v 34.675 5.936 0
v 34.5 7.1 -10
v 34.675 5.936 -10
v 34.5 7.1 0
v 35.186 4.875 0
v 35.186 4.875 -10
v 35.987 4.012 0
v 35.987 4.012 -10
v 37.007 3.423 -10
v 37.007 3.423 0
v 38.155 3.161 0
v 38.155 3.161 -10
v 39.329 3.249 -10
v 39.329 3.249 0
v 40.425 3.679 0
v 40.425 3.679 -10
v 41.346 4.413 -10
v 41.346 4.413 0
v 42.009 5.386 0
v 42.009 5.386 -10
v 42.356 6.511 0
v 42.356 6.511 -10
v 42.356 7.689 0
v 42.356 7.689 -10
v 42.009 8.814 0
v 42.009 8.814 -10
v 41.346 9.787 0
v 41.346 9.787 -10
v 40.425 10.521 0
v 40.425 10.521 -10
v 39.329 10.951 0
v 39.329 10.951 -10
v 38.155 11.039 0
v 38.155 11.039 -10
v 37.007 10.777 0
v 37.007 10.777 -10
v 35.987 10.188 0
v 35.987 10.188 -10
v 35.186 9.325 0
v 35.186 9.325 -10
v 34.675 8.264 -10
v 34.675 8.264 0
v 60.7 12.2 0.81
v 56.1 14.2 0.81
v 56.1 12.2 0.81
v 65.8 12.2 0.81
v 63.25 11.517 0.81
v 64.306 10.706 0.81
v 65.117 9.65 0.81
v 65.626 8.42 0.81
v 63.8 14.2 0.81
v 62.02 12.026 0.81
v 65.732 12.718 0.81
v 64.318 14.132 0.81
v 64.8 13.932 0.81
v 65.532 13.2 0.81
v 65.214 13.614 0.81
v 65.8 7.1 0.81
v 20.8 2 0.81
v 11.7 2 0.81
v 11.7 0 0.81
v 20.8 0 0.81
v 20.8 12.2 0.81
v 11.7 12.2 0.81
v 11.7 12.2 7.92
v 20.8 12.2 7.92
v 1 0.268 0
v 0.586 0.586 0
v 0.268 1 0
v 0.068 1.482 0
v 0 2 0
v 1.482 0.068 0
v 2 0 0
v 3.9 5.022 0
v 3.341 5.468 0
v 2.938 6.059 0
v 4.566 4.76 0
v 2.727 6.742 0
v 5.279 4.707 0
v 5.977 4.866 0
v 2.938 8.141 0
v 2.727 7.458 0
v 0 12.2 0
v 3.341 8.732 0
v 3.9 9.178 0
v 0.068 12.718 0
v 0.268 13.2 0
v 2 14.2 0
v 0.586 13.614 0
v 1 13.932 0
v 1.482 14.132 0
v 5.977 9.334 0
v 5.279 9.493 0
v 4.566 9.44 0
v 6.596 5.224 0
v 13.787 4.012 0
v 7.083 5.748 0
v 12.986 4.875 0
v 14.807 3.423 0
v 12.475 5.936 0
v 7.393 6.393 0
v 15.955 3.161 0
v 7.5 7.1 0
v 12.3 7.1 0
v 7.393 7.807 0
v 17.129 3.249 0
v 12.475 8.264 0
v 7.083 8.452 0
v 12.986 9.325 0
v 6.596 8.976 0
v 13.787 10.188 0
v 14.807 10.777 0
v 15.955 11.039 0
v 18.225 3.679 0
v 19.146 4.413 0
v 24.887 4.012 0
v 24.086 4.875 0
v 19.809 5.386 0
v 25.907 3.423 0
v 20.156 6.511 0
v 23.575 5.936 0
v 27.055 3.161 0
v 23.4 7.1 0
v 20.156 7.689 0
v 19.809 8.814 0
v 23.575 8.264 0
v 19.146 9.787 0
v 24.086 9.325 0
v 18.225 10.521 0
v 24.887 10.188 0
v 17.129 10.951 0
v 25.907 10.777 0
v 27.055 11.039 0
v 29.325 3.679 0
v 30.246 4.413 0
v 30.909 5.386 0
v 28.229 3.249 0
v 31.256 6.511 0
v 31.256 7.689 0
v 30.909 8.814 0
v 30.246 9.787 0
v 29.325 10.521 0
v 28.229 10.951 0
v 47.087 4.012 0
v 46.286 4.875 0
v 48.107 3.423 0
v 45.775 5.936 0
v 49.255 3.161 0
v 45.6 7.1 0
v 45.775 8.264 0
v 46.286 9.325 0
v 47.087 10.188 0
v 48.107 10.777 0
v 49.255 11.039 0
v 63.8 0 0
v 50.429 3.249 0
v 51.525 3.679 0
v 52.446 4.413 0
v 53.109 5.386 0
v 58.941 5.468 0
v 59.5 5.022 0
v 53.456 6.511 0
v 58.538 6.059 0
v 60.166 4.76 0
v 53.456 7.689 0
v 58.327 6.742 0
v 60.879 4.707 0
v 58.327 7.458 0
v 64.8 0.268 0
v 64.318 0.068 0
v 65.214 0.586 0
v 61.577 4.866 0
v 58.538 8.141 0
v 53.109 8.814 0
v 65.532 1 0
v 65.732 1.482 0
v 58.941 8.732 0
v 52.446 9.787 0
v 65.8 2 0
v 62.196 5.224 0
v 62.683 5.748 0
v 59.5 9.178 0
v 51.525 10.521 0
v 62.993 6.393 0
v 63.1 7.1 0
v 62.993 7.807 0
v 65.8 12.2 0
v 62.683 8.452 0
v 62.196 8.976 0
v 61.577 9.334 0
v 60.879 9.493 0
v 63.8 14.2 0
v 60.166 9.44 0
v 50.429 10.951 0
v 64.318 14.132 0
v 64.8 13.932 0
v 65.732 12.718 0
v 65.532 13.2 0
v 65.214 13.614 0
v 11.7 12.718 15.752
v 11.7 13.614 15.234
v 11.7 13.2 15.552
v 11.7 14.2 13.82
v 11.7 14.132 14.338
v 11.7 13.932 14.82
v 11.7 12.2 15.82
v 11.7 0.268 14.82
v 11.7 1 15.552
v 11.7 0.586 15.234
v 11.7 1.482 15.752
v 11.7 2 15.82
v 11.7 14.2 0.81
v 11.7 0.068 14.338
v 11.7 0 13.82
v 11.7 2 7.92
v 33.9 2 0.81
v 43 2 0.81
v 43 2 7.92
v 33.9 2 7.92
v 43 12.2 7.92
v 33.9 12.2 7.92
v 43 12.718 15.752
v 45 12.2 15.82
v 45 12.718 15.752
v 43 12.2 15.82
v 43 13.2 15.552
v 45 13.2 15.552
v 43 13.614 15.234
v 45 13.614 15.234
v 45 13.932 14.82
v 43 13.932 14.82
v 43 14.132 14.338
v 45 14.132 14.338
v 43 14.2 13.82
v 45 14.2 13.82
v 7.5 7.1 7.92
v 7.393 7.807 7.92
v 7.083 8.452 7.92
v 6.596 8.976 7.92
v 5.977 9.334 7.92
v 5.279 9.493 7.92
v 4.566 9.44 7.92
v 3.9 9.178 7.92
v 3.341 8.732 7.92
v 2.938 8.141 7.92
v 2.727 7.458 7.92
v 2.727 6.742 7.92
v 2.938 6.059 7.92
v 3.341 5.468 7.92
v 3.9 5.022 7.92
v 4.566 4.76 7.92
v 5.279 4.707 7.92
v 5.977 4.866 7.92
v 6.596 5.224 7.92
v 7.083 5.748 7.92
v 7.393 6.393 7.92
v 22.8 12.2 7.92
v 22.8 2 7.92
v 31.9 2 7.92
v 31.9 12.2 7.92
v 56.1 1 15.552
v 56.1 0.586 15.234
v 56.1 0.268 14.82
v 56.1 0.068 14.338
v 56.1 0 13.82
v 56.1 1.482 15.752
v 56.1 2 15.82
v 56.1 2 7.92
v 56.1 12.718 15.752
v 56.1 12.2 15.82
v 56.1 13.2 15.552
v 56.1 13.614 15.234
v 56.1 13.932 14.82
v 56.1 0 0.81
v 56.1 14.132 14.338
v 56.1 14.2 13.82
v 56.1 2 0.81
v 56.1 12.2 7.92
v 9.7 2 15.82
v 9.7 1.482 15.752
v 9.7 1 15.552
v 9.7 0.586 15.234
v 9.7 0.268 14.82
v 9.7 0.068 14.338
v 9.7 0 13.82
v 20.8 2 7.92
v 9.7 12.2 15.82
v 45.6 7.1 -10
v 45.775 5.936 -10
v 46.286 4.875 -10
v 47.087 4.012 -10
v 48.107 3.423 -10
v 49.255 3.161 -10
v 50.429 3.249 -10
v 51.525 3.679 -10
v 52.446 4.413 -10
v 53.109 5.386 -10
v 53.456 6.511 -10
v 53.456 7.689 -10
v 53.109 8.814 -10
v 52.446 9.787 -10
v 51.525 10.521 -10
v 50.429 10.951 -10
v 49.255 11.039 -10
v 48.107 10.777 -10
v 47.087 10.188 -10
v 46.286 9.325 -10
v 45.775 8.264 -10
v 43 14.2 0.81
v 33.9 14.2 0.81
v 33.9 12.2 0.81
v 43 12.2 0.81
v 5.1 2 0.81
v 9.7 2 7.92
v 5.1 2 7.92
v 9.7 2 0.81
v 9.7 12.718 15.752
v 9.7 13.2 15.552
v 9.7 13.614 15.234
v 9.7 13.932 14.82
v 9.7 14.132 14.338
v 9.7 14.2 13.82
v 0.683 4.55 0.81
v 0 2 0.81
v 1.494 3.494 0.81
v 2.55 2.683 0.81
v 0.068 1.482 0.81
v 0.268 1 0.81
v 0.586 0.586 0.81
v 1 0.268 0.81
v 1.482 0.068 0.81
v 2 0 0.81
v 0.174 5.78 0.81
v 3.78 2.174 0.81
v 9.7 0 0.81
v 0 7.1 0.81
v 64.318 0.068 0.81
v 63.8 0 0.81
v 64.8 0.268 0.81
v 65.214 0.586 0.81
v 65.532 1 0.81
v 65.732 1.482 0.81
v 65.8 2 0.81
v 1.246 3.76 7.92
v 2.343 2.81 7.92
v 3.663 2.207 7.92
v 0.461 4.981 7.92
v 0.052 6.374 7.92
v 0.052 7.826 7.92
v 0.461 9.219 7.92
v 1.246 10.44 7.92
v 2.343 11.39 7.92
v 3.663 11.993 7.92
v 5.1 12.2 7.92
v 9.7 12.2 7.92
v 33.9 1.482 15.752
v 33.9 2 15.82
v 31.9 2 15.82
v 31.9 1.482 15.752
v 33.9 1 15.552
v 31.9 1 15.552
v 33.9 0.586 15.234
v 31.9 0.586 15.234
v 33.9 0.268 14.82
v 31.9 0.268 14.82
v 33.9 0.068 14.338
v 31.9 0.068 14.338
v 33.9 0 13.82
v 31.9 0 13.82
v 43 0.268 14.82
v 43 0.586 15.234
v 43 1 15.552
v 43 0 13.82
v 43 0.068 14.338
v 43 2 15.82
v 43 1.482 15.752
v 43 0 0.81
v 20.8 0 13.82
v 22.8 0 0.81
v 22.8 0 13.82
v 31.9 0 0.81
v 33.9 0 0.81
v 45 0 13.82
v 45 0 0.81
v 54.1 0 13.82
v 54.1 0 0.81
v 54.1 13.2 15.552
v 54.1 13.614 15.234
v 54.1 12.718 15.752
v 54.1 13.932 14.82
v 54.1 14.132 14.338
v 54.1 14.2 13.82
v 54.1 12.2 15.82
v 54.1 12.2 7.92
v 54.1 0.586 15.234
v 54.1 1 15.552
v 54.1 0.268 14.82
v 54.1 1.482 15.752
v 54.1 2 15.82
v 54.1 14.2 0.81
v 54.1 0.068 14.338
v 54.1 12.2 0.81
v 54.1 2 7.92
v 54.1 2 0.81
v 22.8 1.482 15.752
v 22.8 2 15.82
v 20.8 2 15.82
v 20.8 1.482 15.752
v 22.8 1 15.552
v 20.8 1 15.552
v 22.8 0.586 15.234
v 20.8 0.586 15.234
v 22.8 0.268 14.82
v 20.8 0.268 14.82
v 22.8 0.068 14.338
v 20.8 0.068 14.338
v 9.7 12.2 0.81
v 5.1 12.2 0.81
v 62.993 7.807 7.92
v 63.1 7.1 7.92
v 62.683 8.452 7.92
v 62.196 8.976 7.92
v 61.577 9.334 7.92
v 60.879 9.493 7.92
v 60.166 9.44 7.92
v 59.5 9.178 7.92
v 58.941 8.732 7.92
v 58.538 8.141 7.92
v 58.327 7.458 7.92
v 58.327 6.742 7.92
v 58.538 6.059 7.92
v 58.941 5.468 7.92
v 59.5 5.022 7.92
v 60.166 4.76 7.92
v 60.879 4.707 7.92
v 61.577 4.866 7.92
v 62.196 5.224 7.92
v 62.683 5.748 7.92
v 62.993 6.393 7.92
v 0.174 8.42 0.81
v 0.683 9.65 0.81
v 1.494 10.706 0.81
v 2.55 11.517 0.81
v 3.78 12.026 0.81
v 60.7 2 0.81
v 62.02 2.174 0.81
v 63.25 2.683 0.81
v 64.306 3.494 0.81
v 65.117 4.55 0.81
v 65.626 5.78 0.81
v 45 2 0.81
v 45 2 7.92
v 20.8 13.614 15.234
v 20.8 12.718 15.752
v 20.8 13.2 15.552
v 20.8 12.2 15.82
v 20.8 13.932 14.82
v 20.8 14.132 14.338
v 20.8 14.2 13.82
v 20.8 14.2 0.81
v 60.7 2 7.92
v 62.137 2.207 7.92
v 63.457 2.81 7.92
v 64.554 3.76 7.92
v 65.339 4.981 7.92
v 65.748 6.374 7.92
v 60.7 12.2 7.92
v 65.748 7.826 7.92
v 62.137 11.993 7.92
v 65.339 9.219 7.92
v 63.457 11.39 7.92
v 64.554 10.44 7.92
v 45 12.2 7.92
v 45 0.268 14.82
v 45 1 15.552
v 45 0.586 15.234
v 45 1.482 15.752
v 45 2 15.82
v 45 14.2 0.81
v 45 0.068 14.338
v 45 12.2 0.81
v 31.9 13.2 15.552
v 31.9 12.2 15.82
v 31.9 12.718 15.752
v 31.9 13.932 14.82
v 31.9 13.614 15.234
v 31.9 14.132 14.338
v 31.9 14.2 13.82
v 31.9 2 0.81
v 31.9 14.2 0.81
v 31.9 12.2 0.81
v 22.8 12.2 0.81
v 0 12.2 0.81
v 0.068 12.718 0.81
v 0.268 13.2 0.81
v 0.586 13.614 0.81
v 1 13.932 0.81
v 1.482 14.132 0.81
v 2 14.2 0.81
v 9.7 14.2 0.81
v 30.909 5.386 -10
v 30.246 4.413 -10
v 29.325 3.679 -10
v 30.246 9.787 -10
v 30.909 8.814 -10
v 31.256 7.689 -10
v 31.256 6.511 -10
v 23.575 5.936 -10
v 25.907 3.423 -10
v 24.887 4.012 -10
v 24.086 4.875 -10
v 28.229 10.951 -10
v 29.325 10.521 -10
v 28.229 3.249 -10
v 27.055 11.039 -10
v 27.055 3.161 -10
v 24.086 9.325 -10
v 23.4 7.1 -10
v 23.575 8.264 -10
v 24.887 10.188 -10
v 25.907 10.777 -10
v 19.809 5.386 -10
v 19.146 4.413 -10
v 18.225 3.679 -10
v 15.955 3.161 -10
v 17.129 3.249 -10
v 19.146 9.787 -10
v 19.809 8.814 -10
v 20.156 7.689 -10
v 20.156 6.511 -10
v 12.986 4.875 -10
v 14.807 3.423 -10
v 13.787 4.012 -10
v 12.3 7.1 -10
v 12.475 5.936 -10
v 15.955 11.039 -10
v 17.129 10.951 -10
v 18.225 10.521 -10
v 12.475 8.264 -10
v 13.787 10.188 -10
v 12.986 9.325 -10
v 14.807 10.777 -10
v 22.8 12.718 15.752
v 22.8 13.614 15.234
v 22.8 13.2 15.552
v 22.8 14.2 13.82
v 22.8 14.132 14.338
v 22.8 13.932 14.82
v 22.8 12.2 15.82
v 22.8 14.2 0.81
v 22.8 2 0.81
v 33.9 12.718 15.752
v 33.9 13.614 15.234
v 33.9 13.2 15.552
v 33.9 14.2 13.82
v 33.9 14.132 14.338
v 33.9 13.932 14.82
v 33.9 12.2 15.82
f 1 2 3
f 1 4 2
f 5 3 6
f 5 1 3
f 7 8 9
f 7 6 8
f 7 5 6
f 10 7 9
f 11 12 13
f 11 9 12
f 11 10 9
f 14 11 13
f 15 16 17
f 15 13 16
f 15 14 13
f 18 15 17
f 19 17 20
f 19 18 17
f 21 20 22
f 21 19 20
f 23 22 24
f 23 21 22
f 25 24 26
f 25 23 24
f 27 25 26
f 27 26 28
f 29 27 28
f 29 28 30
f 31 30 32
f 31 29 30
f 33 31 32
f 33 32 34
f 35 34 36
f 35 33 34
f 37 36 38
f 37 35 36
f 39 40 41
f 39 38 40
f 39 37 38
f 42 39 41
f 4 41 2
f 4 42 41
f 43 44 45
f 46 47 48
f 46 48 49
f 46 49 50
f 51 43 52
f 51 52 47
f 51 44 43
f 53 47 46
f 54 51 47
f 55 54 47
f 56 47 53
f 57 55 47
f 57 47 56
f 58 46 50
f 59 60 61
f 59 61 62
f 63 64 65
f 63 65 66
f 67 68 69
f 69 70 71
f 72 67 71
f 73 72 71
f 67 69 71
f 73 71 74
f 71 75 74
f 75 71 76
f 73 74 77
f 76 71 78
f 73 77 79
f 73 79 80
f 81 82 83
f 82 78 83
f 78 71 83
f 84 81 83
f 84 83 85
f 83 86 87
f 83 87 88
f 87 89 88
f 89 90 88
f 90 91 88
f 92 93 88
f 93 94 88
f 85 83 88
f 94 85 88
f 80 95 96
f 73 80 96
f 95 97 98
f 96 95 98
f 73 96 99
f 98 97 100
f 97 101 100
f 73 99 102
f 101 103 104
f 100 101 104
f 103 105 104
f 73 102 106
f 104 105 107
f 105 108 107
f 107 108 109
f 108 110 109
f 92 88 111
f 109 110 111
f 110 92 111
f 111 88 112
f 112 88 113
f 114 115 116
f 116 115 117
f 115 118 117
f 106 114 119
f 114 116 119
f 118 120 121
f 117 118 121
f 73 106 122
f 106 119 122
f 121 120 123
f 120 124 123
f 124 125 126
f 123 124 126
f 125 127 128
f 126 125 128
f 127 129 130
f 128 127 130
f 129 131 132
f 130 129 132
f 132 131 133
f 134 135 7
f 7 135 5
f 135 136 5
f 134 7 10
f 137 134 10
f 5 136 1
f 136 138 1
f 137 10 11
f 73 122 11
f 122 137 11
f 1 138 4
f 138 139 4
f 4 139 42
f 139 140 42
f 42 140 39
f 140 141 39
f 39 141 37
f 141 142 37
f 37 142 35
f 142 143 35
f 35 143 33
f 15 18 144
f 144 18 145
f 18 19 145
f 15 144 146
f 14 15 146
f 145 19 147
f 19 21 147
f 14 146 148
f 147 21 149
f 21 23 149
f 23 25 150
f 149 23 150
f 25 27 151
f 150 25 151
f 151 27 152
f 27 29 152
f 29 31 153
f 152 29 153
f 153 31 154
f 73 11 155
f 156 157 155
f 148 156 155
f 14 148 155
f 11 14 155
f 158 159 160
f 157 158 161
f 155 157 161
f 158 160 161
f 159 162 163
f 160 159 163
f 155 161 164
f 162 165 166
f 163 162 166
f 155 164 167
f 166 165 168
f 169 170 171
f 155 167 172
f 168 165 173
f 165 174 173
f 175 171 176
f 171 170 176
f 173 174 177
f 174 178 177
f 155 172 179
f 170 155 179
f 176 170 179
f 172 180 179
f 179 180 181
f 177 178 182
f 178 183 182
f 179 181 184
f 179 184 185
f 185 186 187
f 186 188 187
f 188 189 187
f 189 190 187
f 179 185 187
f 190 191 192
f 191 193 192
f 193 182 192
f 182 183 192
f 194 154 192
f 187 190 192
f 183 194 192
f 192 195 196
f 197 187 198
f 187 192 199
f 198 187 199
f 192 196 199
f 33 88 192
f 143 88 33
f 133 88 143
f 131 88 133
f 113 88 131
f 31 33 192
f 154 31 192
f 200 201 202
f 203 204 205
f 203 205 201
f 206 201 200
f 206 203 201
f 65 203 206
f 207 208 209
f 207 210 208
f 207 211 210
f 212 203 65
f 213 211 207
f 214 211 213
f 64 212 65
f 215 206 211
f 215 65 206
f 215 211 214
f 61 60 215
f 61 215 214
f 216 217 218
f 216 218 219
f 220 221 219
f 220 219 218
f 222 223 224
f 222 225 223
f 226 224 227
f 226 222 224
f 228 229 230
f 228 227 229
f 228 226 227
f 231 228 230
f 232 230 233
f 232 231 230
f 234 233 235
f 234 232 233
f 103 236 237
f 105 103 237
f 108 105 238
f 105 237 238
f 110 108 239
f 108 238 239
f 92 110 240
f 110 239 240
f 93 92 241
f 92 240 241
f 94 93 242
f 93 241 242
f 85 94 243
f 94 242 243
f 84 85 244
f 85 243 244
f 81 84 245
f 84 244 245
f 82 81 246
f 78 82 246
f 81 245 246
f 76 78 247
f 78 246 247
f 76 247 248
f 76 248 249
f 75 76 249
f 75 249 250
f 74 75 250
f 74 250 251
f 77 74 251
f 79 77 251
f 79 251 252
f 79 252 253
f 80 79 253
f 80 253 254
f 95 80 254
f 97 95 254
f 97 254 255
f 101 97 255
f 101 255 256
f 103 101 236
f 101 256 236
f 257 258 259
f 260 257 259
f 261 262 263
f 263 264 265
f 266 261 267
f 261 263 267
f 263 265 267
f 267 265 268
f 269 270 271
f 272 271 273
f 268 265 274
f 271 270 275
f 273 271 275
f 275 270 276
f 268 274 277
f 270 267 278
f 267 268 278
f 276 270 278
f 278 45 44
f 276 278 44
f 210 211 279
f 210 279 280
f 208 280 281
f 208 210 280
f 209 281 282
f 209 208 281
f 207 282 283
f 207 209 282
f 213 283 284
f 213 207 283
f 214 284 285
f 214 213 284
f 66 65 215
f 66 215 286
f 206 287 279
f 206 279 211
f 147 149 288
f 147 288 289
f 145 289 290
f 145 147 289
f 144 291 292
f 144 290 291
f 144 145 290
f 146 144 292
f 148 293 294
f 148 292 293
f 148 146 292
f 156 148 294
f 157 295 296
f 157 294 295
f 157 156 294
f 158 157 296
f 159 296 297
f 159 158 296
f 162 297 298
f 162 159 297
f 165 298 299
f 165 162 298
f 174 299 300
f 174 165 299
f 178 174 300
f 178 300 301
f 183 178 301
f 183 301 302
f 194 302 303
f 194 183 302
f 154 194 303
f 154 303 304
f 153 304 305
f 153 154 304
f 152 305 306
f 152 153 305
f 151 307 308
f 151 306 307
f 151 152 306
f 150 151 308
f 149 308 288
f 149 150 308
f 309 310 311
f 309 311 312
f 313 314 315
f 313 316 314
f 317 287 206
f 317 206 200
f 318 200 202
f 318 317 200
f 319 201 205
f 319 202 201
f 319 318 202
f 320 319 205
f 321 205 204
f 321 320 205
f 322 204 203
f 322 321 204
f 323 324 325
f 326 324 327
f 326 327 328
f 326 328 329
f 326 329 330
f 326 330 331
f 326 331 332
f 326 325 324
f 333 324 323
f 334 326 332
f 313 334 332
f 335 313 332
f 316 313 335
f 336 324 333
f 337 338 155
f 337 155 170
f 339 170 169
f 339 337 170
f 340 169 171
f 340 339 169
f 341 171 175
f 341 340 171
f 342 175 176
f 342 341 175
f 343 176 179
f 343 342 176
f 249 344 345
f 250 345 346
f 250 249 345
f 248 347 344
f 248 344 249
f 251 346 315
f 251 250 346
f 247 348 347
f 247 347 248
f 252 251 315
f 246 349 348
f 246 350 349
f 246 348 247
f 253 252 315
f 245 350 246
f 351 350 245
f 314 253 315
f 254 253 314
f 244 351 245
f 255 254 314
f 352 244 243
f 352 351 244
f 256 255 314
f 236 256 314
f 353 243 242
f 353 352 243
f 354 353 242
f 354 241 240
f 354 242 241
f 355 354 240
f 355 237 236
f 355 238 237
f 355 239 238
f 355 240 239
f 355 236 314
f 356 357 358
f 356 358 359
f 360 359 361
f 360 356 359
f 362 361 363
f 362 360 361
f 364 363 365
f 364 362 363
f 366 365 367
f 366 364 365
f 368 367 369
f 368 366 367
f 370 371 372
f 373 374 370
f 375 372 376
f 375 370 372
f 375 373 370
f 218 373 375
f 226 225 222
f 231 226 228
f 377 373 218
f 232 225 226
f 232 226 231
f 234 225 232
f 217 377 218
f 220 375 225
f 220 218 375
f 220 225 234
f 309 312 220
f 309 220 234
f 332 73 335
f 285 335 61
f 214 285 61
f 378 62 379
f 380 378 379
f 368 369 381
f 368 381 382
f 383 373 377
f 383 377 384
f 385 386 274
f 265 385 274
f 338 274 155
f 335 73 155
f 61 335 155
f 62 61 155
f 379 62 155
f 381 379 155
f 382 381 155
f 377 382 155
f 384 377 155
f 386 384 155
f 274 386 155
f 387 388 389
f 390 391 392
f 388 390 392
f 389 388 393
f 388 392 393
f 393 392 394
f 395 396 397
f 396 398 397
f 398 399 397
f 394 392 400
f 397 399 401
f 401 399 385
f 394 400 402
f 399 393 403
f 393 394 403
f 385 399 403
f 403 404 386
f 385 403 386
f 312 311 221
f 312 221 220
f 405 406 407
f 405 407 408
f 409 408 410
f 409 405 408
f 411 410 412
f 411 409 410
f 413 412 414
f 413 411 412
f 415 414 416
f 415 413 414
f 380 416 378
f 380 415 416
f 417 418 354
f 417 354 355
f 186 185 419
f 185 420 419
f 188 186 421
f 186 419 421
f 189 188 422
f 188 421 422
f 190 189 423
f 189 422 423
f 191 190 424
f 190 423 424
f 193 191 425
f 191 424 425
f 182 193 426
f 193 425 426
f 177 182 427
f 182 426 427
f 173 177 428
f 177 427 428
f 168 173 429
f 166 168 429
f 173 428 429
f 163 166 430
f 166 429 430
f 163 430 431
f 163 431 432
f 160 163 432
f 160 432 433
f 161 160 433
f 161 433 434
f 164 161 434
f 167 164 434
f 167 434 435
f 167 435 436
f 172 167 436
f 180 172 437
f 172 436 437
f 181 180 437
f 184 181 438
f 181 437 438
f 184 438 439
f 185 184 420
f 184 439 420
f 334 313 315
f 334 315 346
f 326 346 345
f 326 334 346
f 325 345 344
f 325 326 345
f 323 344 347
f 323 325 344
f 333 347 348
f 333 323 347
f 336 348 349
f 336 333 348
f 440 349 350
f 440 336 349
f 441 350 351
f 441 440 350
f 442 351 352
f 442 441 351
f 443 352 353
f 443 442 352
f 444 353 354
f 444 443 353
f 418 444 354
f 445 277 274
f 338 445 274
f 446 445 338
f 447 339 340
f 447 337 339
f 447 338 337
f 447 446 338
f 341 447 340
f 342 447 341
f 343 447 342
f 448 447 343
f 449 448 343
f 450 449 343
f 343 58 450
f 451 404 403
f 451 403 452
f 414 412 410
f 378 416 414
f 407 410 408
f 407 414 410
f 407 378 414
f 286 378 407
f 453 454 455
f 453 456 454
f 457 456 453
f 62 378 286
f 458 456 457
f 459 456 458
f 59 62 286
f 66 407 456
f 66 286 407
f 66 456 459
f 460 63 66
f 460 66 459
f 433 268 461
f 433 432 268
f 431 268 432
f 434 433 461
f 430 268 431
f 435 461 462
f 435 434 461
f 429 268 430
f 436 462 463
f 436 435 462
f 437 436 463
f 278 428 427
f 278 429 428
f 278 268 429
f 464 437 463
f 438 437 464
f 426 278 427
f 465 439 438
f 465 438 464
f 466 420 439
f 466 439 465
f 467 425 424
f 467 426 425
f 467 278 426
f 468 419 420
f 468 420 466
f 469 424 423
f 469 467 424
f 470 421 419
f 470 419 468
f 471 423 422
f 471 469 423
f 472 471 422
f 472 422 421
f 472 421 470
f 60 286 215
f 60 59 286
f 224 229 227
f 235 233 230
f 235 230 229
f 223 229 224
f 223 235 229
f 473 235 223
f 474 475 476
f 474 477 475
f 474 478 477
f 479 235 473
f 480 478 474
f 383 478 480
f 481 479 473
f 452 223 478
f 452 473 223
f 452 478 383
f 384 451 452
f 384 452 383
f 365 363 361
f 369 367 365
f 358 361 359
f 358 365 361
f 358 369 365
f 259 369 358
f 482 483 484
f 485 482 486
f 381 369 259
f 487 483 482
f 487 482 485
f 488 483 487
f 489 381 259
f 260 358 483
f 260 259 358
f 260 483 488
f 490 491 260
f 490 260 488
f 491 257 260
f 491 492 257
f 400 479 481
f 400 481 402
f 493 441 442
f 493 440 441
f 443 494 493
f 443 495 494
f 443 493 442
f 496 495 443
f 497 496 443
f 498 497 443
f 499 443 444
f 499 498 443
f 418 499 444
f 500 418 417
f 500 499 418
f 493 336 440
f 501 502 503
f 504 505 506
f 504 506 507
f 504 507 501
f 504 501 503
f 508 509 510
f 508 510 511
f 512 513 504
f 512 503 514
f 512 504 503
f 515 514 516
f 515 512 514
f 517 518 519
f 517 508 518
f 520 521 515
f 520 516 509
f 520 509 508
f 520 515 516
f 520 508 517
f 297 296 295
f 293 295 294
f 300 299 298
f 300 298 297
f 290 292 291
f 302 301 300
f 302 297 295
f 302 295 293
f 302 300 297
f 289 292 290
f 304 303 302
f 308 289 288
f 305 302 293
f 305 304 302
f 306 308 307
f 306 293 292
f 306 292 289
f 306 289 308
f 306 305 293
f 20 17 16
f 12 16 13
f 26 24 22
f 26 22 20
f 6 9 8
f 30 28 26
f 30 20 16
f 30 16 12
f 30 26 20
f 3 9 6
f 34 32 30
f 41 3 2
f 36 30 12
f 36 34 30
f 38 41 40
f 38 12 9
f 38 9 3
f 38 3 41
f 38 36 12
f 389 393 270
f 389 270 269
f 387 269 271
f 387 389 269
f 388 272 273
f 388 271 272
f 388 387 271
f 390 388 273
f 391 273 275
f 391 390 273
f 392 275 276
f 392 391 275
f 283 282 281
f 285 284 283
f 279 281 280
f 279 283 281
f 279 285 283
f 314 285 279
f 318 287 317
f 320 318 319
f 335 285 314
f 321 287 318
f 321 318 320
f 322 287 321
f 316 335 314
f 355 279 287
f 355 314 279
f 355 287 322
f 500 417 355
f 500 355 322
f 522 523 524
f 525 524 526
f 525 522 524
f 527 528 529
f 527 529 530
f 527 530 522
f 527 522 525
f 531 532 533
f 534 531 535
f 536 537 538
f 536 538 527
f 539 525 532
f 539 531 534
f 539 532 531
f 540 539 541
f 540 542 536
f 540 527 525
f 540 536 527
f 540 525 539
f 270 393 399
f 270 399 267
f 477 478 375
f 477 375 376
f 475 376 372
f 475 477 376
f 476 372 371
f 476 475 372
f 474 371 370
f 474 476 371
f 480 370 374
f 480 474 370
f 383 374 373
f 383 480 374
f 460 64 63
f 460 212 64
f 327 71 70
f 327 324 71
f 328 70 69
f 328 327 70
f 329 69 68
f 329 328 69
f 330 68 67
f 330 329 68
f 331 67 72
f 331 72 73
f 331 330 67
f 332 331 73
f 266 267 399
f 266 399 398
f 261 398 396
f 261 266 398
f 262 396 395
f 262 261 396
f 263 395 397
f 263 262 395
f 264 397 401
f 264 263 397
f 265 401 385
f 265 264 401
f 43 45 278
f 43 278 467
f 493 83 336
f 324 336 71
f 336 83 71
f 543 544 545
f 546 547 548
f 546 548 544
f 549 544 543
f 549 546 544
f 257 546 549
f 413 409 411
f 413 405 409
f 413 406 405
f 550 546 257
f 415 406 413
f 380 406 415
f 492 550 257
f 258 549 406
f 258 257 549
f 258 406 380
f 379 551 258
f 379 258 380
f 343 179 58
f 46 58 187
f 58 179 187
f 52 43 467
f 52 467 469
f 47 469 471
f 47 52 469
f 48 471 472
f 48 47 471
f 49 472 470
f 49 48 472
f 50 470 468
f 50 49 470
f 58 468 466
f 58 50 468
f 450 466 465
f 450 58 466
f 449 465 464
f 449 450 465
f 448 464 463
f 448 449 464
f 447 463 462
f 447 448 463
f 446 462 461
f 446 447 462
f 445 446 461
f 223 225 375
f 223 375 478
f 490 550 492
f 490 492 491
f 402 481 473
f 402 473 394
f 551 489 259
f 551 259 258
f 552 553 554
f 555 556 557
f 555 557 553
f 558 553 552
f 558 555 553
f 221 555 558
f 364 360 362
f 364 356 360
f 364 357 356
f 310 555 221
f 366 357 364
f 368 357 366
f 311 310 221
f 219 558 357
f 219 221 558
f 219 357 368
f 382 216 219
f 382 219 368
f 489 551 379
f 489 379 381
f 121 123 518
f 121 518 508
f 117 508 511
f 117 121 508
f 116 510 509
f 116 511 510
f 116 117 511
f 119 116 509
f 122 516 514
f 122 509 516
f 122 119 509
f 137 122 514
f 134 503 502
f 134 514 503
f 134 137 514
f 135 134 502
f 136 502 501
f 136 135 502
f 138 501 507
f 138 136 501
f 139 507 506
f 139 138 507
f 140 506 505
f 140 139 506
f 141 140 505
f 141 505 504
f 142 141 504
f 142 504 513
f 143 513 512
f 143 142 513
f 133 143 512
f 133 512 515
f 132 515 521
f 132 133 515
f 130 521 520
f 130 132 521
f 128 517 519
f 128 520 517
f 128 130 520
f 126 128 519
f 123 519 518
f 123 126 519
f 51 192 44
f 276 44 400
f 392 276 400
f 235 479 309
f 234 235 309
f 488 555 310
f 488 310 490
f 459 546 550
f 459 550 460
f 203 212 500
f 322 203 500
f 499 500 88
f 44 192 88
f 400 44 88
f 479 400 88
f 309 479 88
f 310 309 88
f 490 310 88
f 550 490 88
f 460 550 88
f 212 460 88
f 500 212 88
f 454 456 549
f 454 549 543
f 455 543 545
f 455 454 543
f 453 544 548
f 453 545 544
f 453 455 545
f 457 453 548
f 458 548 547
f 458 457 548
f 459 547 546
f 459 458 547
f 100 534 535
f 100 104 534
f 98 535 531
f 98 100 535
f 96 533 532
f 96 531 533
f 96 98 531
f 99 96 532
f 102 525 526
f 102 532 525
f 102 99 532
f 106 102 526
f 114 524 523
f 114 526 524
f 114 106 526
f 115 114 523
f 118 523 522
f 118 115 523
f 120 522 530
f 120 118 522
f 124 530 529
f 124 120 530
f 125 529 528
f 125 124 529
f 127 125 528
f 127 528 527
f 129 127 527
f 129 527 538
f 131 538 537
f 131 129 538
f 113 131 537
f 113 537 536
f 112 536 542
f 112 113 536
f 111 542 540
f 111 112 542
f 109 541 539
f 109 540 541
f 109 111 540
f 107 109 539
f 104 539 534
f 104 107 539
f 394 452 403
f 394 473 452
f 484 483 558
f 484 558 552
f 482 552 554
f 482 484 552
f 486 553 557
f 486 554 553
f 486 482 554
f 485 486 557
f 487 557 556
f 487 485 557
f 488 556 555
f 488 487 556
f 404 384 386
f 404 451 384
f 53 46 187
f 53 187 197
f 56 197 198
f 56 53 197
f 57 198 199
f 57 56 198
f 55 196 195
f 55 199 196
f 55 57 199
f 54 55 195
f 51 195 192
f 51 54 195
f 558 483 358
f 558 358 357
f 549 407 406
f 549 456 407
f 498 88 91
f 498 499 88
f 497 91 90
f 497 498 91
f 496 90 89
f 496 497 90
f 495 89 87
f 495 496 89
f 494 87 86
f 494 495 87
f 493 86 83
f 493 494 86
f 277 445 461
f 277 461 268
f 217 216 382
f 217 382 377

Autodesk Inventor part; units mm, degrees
ref_plane "YZ Plane" through (0, 0, 0) normal (1, 0, 0) x (0, 1, 0)
ref_plane "XZ Plane" through (0, 0, 0) normal (0, 1, 0) x (-1, 0, 0)
ref_plane "XY Plane" through (0, 0, 0) normal (0, 0, 1) x (1, 0, 0)
sketch "Sketch1" plane through (0, 0, 0) normal (0, 0, 1) x (1, 0, 0)
  line L0 (0, 0) -> (65.8, 0)
  line L1 (65.8, 0) -> (65.8, 14.2)
  line L2 (65.8, 14.2) -> (0, 14.2)
  line L3 (0, 14.2) -> (0, 0)
  dimension "d0" = 65.8
  dimension "d1" = 14.2
extrude "Extrusion1" add sketch "Sketch1" along normal blind 0.81
fillet "Fillet1" radius 2 4 edges at (0, 14.2, 0.405) (65.8, 14.2, 0.405) (65.8, 0, 0.405) (0, 0, 0.405)
sketch "Sketch2" plane through (0, 0, 0.81) normal (0, 0, 1) x (1, 0, 0)
  circle A0 centre (5.1, 7.1) radius 5.1
  line L0 (0, 12.2) -> (0, 2) projected
  circle A1 centre (60.7, 7.1) radius 5.1
  line L1 (65.8, 2) -> (65.8, 12.2) projected
  line L2 (5.1, 12.2) -> (60.7, 12.2)
  line L3 (60.7, 2) -> (5.1, 2)
  point P0 (0, 0)
  point P1 (0, 7.1)
  dimension "d5" = 10.2
  dimension "d6" = 10.2
extrude "Extrusion2" add sketch "Sketch2" along normal blind 7.11
sketch "Sketch3" plane through (0, 0, 7.92) normal (0, 0, 1) x (1, 0, 0)
  line L0 (2, 0) -> (63.8, 0) projected
  line L1 (32.9, 0) -> (32.9, 14.2) construction
  line L2 (63.8, 14.2) -> (2, 14.2) projected
  circle A0 centre (5.1, 7.1) radius 2.4
  circle A1 centre (60.7, 7.1) radius 2.4
  line L3 (5.1, 7.1) -> (60.7, 7.1) construction
  point P0 (0, 0)
  dimension "d9" = 4.8
  dimension "d10" = 4.8
  dimension "d12" = 27.8
  dimension "d13" = 27.8
  dimension "d14" = 7.1
extrude "Extrusion3" cut sketch "Sketch3" against normal through all
sketch "Sketch4" plane through (0, 0, 7.92) normal (0, 0, 1) x (1, 0, 0)
  line L0 (63.8, 14.2) -> (2, 14.2) projected
  line L1 (32.9, 14.2) -> (32.9, 0) construction
  line L2 (2, 0) -> (63.8, 0) projected
  line L3 (31.9, 14.2) -> (33.9, 14.2)
  line L4 (33.9, 14.2) -> (33.9, 0)
  line L5 (33.9, 0) -> (31.9, 0)
  line L6 (31.9, 0) -> (31.9, 14.2)
  line L7 (20.8, 14.2) -> (22.8, 14.2)
  line L8 (22.8, 14.2) -> (22.8, 0)
  line L9 (22.8, 0) -> (20.8, 0)
  line L10 (20.8, 0) -> (20.8, 14.2)
  line L11 (11.7, 0) -> (9.7, 0)
  line L12 (9.7, 0) -> (9.7, 14.2)
  line L13 (9.7, 14.2) -> (11.7, 14.2)
  line L14 (11.7, 14.2) -> (11.7, 0)
  line L15 (43, 14.2) -> (45, 14.2)
  line L16 (45, 14.2) -> (45, 0)
  line L17 (45, 0) -> (43, 0)
  line L18 (43, 0) -> (43, 14.2)
  line L19 (54.1, 0) -> (56.1, 0)
  line L20 (56.1, 0) -> (56.1, 14.2)
  line L21 (56.1, 14.2) -> (54.1, 14.2)
  line L22 (54.1, 14.2) -> (54.1, 0)
  point P0 (0, 0)
  dimension "d17" = 2
  dimension "d18" = 1
  dimension "d19" = 2
  dimension "d20" = 11.1
  dimension "d21" = 11.1
  dimension "d22" = 2
  dimension "d23" = 2
  dimension "d24" = 11.1
  dimension "d25" = 2
  dimension "d26" = 11.1
extrude "Extrusion4" add sketch "Sketch4" along normal mid plane 15.8 contours L20 L2 L22 L0 | L16 L2 L18 L0 | L4 L2 L6 L0 | L8 L2 L10 L0 | L14 L2 L12 L0
fillet "Fillet2" radius 2 10 edges at (10.7, 14.2, 15.82) (21.8, 14.2, 15.82) (32.9, 14.2, 15.82) (44, 14.2, 15.82) (55.1, 14.2, 15.82) (55.1, 0, 15.82) (44, 0, 15.82) (32.9, 0, 15.82) (21.8, 0, 15.82) (10.7, 0, 15.82)
sketch "Sketch5" plane through (0, 0, 0) normal (0, 0, -1) x (-1, 0, 0)
  arc A0 (-65.8, 7.1) -> (-60.7, 2) centre (-60.7, 7.1) ccw projected
  line L0 (0, 7.1) -> (0, 2) projected
  line L1 (-65.8, 7.1) -> (0, 7.1) construction
  circle A1 centre (-38.45, 7.1) radius 3.95
  circle A2 centre (-49.55, 7.1) radius 3.95
  circle A3 centre (-27.35, 7.1) radius 3.95
  circle A4 centre (-16.25, 7.1) radius 3.95
  line L2 (-2, 0) -> (-63.8, 0) projected
  line L3 (-32.9, 0) -> (-32.9, 14.1224) construction
  line L4 (-31.9, 2) -> (-31.9, 12.2) projected
  point P0 (0, 0)
  dimension "d30" = 7.9
  dimension "d31" = 7.9
  dimension "d32" = 7.9
  dimension "d33" = 7.9
  dimension "d34" = 5.55
  dimension "d35" = 5.55
  dimension "d36" = 11.1
  dimension "d37" = 11.1
extrude "Extrusion5" add sketch "Sketch5" along normal blind 10
properties part number "52160004A"
